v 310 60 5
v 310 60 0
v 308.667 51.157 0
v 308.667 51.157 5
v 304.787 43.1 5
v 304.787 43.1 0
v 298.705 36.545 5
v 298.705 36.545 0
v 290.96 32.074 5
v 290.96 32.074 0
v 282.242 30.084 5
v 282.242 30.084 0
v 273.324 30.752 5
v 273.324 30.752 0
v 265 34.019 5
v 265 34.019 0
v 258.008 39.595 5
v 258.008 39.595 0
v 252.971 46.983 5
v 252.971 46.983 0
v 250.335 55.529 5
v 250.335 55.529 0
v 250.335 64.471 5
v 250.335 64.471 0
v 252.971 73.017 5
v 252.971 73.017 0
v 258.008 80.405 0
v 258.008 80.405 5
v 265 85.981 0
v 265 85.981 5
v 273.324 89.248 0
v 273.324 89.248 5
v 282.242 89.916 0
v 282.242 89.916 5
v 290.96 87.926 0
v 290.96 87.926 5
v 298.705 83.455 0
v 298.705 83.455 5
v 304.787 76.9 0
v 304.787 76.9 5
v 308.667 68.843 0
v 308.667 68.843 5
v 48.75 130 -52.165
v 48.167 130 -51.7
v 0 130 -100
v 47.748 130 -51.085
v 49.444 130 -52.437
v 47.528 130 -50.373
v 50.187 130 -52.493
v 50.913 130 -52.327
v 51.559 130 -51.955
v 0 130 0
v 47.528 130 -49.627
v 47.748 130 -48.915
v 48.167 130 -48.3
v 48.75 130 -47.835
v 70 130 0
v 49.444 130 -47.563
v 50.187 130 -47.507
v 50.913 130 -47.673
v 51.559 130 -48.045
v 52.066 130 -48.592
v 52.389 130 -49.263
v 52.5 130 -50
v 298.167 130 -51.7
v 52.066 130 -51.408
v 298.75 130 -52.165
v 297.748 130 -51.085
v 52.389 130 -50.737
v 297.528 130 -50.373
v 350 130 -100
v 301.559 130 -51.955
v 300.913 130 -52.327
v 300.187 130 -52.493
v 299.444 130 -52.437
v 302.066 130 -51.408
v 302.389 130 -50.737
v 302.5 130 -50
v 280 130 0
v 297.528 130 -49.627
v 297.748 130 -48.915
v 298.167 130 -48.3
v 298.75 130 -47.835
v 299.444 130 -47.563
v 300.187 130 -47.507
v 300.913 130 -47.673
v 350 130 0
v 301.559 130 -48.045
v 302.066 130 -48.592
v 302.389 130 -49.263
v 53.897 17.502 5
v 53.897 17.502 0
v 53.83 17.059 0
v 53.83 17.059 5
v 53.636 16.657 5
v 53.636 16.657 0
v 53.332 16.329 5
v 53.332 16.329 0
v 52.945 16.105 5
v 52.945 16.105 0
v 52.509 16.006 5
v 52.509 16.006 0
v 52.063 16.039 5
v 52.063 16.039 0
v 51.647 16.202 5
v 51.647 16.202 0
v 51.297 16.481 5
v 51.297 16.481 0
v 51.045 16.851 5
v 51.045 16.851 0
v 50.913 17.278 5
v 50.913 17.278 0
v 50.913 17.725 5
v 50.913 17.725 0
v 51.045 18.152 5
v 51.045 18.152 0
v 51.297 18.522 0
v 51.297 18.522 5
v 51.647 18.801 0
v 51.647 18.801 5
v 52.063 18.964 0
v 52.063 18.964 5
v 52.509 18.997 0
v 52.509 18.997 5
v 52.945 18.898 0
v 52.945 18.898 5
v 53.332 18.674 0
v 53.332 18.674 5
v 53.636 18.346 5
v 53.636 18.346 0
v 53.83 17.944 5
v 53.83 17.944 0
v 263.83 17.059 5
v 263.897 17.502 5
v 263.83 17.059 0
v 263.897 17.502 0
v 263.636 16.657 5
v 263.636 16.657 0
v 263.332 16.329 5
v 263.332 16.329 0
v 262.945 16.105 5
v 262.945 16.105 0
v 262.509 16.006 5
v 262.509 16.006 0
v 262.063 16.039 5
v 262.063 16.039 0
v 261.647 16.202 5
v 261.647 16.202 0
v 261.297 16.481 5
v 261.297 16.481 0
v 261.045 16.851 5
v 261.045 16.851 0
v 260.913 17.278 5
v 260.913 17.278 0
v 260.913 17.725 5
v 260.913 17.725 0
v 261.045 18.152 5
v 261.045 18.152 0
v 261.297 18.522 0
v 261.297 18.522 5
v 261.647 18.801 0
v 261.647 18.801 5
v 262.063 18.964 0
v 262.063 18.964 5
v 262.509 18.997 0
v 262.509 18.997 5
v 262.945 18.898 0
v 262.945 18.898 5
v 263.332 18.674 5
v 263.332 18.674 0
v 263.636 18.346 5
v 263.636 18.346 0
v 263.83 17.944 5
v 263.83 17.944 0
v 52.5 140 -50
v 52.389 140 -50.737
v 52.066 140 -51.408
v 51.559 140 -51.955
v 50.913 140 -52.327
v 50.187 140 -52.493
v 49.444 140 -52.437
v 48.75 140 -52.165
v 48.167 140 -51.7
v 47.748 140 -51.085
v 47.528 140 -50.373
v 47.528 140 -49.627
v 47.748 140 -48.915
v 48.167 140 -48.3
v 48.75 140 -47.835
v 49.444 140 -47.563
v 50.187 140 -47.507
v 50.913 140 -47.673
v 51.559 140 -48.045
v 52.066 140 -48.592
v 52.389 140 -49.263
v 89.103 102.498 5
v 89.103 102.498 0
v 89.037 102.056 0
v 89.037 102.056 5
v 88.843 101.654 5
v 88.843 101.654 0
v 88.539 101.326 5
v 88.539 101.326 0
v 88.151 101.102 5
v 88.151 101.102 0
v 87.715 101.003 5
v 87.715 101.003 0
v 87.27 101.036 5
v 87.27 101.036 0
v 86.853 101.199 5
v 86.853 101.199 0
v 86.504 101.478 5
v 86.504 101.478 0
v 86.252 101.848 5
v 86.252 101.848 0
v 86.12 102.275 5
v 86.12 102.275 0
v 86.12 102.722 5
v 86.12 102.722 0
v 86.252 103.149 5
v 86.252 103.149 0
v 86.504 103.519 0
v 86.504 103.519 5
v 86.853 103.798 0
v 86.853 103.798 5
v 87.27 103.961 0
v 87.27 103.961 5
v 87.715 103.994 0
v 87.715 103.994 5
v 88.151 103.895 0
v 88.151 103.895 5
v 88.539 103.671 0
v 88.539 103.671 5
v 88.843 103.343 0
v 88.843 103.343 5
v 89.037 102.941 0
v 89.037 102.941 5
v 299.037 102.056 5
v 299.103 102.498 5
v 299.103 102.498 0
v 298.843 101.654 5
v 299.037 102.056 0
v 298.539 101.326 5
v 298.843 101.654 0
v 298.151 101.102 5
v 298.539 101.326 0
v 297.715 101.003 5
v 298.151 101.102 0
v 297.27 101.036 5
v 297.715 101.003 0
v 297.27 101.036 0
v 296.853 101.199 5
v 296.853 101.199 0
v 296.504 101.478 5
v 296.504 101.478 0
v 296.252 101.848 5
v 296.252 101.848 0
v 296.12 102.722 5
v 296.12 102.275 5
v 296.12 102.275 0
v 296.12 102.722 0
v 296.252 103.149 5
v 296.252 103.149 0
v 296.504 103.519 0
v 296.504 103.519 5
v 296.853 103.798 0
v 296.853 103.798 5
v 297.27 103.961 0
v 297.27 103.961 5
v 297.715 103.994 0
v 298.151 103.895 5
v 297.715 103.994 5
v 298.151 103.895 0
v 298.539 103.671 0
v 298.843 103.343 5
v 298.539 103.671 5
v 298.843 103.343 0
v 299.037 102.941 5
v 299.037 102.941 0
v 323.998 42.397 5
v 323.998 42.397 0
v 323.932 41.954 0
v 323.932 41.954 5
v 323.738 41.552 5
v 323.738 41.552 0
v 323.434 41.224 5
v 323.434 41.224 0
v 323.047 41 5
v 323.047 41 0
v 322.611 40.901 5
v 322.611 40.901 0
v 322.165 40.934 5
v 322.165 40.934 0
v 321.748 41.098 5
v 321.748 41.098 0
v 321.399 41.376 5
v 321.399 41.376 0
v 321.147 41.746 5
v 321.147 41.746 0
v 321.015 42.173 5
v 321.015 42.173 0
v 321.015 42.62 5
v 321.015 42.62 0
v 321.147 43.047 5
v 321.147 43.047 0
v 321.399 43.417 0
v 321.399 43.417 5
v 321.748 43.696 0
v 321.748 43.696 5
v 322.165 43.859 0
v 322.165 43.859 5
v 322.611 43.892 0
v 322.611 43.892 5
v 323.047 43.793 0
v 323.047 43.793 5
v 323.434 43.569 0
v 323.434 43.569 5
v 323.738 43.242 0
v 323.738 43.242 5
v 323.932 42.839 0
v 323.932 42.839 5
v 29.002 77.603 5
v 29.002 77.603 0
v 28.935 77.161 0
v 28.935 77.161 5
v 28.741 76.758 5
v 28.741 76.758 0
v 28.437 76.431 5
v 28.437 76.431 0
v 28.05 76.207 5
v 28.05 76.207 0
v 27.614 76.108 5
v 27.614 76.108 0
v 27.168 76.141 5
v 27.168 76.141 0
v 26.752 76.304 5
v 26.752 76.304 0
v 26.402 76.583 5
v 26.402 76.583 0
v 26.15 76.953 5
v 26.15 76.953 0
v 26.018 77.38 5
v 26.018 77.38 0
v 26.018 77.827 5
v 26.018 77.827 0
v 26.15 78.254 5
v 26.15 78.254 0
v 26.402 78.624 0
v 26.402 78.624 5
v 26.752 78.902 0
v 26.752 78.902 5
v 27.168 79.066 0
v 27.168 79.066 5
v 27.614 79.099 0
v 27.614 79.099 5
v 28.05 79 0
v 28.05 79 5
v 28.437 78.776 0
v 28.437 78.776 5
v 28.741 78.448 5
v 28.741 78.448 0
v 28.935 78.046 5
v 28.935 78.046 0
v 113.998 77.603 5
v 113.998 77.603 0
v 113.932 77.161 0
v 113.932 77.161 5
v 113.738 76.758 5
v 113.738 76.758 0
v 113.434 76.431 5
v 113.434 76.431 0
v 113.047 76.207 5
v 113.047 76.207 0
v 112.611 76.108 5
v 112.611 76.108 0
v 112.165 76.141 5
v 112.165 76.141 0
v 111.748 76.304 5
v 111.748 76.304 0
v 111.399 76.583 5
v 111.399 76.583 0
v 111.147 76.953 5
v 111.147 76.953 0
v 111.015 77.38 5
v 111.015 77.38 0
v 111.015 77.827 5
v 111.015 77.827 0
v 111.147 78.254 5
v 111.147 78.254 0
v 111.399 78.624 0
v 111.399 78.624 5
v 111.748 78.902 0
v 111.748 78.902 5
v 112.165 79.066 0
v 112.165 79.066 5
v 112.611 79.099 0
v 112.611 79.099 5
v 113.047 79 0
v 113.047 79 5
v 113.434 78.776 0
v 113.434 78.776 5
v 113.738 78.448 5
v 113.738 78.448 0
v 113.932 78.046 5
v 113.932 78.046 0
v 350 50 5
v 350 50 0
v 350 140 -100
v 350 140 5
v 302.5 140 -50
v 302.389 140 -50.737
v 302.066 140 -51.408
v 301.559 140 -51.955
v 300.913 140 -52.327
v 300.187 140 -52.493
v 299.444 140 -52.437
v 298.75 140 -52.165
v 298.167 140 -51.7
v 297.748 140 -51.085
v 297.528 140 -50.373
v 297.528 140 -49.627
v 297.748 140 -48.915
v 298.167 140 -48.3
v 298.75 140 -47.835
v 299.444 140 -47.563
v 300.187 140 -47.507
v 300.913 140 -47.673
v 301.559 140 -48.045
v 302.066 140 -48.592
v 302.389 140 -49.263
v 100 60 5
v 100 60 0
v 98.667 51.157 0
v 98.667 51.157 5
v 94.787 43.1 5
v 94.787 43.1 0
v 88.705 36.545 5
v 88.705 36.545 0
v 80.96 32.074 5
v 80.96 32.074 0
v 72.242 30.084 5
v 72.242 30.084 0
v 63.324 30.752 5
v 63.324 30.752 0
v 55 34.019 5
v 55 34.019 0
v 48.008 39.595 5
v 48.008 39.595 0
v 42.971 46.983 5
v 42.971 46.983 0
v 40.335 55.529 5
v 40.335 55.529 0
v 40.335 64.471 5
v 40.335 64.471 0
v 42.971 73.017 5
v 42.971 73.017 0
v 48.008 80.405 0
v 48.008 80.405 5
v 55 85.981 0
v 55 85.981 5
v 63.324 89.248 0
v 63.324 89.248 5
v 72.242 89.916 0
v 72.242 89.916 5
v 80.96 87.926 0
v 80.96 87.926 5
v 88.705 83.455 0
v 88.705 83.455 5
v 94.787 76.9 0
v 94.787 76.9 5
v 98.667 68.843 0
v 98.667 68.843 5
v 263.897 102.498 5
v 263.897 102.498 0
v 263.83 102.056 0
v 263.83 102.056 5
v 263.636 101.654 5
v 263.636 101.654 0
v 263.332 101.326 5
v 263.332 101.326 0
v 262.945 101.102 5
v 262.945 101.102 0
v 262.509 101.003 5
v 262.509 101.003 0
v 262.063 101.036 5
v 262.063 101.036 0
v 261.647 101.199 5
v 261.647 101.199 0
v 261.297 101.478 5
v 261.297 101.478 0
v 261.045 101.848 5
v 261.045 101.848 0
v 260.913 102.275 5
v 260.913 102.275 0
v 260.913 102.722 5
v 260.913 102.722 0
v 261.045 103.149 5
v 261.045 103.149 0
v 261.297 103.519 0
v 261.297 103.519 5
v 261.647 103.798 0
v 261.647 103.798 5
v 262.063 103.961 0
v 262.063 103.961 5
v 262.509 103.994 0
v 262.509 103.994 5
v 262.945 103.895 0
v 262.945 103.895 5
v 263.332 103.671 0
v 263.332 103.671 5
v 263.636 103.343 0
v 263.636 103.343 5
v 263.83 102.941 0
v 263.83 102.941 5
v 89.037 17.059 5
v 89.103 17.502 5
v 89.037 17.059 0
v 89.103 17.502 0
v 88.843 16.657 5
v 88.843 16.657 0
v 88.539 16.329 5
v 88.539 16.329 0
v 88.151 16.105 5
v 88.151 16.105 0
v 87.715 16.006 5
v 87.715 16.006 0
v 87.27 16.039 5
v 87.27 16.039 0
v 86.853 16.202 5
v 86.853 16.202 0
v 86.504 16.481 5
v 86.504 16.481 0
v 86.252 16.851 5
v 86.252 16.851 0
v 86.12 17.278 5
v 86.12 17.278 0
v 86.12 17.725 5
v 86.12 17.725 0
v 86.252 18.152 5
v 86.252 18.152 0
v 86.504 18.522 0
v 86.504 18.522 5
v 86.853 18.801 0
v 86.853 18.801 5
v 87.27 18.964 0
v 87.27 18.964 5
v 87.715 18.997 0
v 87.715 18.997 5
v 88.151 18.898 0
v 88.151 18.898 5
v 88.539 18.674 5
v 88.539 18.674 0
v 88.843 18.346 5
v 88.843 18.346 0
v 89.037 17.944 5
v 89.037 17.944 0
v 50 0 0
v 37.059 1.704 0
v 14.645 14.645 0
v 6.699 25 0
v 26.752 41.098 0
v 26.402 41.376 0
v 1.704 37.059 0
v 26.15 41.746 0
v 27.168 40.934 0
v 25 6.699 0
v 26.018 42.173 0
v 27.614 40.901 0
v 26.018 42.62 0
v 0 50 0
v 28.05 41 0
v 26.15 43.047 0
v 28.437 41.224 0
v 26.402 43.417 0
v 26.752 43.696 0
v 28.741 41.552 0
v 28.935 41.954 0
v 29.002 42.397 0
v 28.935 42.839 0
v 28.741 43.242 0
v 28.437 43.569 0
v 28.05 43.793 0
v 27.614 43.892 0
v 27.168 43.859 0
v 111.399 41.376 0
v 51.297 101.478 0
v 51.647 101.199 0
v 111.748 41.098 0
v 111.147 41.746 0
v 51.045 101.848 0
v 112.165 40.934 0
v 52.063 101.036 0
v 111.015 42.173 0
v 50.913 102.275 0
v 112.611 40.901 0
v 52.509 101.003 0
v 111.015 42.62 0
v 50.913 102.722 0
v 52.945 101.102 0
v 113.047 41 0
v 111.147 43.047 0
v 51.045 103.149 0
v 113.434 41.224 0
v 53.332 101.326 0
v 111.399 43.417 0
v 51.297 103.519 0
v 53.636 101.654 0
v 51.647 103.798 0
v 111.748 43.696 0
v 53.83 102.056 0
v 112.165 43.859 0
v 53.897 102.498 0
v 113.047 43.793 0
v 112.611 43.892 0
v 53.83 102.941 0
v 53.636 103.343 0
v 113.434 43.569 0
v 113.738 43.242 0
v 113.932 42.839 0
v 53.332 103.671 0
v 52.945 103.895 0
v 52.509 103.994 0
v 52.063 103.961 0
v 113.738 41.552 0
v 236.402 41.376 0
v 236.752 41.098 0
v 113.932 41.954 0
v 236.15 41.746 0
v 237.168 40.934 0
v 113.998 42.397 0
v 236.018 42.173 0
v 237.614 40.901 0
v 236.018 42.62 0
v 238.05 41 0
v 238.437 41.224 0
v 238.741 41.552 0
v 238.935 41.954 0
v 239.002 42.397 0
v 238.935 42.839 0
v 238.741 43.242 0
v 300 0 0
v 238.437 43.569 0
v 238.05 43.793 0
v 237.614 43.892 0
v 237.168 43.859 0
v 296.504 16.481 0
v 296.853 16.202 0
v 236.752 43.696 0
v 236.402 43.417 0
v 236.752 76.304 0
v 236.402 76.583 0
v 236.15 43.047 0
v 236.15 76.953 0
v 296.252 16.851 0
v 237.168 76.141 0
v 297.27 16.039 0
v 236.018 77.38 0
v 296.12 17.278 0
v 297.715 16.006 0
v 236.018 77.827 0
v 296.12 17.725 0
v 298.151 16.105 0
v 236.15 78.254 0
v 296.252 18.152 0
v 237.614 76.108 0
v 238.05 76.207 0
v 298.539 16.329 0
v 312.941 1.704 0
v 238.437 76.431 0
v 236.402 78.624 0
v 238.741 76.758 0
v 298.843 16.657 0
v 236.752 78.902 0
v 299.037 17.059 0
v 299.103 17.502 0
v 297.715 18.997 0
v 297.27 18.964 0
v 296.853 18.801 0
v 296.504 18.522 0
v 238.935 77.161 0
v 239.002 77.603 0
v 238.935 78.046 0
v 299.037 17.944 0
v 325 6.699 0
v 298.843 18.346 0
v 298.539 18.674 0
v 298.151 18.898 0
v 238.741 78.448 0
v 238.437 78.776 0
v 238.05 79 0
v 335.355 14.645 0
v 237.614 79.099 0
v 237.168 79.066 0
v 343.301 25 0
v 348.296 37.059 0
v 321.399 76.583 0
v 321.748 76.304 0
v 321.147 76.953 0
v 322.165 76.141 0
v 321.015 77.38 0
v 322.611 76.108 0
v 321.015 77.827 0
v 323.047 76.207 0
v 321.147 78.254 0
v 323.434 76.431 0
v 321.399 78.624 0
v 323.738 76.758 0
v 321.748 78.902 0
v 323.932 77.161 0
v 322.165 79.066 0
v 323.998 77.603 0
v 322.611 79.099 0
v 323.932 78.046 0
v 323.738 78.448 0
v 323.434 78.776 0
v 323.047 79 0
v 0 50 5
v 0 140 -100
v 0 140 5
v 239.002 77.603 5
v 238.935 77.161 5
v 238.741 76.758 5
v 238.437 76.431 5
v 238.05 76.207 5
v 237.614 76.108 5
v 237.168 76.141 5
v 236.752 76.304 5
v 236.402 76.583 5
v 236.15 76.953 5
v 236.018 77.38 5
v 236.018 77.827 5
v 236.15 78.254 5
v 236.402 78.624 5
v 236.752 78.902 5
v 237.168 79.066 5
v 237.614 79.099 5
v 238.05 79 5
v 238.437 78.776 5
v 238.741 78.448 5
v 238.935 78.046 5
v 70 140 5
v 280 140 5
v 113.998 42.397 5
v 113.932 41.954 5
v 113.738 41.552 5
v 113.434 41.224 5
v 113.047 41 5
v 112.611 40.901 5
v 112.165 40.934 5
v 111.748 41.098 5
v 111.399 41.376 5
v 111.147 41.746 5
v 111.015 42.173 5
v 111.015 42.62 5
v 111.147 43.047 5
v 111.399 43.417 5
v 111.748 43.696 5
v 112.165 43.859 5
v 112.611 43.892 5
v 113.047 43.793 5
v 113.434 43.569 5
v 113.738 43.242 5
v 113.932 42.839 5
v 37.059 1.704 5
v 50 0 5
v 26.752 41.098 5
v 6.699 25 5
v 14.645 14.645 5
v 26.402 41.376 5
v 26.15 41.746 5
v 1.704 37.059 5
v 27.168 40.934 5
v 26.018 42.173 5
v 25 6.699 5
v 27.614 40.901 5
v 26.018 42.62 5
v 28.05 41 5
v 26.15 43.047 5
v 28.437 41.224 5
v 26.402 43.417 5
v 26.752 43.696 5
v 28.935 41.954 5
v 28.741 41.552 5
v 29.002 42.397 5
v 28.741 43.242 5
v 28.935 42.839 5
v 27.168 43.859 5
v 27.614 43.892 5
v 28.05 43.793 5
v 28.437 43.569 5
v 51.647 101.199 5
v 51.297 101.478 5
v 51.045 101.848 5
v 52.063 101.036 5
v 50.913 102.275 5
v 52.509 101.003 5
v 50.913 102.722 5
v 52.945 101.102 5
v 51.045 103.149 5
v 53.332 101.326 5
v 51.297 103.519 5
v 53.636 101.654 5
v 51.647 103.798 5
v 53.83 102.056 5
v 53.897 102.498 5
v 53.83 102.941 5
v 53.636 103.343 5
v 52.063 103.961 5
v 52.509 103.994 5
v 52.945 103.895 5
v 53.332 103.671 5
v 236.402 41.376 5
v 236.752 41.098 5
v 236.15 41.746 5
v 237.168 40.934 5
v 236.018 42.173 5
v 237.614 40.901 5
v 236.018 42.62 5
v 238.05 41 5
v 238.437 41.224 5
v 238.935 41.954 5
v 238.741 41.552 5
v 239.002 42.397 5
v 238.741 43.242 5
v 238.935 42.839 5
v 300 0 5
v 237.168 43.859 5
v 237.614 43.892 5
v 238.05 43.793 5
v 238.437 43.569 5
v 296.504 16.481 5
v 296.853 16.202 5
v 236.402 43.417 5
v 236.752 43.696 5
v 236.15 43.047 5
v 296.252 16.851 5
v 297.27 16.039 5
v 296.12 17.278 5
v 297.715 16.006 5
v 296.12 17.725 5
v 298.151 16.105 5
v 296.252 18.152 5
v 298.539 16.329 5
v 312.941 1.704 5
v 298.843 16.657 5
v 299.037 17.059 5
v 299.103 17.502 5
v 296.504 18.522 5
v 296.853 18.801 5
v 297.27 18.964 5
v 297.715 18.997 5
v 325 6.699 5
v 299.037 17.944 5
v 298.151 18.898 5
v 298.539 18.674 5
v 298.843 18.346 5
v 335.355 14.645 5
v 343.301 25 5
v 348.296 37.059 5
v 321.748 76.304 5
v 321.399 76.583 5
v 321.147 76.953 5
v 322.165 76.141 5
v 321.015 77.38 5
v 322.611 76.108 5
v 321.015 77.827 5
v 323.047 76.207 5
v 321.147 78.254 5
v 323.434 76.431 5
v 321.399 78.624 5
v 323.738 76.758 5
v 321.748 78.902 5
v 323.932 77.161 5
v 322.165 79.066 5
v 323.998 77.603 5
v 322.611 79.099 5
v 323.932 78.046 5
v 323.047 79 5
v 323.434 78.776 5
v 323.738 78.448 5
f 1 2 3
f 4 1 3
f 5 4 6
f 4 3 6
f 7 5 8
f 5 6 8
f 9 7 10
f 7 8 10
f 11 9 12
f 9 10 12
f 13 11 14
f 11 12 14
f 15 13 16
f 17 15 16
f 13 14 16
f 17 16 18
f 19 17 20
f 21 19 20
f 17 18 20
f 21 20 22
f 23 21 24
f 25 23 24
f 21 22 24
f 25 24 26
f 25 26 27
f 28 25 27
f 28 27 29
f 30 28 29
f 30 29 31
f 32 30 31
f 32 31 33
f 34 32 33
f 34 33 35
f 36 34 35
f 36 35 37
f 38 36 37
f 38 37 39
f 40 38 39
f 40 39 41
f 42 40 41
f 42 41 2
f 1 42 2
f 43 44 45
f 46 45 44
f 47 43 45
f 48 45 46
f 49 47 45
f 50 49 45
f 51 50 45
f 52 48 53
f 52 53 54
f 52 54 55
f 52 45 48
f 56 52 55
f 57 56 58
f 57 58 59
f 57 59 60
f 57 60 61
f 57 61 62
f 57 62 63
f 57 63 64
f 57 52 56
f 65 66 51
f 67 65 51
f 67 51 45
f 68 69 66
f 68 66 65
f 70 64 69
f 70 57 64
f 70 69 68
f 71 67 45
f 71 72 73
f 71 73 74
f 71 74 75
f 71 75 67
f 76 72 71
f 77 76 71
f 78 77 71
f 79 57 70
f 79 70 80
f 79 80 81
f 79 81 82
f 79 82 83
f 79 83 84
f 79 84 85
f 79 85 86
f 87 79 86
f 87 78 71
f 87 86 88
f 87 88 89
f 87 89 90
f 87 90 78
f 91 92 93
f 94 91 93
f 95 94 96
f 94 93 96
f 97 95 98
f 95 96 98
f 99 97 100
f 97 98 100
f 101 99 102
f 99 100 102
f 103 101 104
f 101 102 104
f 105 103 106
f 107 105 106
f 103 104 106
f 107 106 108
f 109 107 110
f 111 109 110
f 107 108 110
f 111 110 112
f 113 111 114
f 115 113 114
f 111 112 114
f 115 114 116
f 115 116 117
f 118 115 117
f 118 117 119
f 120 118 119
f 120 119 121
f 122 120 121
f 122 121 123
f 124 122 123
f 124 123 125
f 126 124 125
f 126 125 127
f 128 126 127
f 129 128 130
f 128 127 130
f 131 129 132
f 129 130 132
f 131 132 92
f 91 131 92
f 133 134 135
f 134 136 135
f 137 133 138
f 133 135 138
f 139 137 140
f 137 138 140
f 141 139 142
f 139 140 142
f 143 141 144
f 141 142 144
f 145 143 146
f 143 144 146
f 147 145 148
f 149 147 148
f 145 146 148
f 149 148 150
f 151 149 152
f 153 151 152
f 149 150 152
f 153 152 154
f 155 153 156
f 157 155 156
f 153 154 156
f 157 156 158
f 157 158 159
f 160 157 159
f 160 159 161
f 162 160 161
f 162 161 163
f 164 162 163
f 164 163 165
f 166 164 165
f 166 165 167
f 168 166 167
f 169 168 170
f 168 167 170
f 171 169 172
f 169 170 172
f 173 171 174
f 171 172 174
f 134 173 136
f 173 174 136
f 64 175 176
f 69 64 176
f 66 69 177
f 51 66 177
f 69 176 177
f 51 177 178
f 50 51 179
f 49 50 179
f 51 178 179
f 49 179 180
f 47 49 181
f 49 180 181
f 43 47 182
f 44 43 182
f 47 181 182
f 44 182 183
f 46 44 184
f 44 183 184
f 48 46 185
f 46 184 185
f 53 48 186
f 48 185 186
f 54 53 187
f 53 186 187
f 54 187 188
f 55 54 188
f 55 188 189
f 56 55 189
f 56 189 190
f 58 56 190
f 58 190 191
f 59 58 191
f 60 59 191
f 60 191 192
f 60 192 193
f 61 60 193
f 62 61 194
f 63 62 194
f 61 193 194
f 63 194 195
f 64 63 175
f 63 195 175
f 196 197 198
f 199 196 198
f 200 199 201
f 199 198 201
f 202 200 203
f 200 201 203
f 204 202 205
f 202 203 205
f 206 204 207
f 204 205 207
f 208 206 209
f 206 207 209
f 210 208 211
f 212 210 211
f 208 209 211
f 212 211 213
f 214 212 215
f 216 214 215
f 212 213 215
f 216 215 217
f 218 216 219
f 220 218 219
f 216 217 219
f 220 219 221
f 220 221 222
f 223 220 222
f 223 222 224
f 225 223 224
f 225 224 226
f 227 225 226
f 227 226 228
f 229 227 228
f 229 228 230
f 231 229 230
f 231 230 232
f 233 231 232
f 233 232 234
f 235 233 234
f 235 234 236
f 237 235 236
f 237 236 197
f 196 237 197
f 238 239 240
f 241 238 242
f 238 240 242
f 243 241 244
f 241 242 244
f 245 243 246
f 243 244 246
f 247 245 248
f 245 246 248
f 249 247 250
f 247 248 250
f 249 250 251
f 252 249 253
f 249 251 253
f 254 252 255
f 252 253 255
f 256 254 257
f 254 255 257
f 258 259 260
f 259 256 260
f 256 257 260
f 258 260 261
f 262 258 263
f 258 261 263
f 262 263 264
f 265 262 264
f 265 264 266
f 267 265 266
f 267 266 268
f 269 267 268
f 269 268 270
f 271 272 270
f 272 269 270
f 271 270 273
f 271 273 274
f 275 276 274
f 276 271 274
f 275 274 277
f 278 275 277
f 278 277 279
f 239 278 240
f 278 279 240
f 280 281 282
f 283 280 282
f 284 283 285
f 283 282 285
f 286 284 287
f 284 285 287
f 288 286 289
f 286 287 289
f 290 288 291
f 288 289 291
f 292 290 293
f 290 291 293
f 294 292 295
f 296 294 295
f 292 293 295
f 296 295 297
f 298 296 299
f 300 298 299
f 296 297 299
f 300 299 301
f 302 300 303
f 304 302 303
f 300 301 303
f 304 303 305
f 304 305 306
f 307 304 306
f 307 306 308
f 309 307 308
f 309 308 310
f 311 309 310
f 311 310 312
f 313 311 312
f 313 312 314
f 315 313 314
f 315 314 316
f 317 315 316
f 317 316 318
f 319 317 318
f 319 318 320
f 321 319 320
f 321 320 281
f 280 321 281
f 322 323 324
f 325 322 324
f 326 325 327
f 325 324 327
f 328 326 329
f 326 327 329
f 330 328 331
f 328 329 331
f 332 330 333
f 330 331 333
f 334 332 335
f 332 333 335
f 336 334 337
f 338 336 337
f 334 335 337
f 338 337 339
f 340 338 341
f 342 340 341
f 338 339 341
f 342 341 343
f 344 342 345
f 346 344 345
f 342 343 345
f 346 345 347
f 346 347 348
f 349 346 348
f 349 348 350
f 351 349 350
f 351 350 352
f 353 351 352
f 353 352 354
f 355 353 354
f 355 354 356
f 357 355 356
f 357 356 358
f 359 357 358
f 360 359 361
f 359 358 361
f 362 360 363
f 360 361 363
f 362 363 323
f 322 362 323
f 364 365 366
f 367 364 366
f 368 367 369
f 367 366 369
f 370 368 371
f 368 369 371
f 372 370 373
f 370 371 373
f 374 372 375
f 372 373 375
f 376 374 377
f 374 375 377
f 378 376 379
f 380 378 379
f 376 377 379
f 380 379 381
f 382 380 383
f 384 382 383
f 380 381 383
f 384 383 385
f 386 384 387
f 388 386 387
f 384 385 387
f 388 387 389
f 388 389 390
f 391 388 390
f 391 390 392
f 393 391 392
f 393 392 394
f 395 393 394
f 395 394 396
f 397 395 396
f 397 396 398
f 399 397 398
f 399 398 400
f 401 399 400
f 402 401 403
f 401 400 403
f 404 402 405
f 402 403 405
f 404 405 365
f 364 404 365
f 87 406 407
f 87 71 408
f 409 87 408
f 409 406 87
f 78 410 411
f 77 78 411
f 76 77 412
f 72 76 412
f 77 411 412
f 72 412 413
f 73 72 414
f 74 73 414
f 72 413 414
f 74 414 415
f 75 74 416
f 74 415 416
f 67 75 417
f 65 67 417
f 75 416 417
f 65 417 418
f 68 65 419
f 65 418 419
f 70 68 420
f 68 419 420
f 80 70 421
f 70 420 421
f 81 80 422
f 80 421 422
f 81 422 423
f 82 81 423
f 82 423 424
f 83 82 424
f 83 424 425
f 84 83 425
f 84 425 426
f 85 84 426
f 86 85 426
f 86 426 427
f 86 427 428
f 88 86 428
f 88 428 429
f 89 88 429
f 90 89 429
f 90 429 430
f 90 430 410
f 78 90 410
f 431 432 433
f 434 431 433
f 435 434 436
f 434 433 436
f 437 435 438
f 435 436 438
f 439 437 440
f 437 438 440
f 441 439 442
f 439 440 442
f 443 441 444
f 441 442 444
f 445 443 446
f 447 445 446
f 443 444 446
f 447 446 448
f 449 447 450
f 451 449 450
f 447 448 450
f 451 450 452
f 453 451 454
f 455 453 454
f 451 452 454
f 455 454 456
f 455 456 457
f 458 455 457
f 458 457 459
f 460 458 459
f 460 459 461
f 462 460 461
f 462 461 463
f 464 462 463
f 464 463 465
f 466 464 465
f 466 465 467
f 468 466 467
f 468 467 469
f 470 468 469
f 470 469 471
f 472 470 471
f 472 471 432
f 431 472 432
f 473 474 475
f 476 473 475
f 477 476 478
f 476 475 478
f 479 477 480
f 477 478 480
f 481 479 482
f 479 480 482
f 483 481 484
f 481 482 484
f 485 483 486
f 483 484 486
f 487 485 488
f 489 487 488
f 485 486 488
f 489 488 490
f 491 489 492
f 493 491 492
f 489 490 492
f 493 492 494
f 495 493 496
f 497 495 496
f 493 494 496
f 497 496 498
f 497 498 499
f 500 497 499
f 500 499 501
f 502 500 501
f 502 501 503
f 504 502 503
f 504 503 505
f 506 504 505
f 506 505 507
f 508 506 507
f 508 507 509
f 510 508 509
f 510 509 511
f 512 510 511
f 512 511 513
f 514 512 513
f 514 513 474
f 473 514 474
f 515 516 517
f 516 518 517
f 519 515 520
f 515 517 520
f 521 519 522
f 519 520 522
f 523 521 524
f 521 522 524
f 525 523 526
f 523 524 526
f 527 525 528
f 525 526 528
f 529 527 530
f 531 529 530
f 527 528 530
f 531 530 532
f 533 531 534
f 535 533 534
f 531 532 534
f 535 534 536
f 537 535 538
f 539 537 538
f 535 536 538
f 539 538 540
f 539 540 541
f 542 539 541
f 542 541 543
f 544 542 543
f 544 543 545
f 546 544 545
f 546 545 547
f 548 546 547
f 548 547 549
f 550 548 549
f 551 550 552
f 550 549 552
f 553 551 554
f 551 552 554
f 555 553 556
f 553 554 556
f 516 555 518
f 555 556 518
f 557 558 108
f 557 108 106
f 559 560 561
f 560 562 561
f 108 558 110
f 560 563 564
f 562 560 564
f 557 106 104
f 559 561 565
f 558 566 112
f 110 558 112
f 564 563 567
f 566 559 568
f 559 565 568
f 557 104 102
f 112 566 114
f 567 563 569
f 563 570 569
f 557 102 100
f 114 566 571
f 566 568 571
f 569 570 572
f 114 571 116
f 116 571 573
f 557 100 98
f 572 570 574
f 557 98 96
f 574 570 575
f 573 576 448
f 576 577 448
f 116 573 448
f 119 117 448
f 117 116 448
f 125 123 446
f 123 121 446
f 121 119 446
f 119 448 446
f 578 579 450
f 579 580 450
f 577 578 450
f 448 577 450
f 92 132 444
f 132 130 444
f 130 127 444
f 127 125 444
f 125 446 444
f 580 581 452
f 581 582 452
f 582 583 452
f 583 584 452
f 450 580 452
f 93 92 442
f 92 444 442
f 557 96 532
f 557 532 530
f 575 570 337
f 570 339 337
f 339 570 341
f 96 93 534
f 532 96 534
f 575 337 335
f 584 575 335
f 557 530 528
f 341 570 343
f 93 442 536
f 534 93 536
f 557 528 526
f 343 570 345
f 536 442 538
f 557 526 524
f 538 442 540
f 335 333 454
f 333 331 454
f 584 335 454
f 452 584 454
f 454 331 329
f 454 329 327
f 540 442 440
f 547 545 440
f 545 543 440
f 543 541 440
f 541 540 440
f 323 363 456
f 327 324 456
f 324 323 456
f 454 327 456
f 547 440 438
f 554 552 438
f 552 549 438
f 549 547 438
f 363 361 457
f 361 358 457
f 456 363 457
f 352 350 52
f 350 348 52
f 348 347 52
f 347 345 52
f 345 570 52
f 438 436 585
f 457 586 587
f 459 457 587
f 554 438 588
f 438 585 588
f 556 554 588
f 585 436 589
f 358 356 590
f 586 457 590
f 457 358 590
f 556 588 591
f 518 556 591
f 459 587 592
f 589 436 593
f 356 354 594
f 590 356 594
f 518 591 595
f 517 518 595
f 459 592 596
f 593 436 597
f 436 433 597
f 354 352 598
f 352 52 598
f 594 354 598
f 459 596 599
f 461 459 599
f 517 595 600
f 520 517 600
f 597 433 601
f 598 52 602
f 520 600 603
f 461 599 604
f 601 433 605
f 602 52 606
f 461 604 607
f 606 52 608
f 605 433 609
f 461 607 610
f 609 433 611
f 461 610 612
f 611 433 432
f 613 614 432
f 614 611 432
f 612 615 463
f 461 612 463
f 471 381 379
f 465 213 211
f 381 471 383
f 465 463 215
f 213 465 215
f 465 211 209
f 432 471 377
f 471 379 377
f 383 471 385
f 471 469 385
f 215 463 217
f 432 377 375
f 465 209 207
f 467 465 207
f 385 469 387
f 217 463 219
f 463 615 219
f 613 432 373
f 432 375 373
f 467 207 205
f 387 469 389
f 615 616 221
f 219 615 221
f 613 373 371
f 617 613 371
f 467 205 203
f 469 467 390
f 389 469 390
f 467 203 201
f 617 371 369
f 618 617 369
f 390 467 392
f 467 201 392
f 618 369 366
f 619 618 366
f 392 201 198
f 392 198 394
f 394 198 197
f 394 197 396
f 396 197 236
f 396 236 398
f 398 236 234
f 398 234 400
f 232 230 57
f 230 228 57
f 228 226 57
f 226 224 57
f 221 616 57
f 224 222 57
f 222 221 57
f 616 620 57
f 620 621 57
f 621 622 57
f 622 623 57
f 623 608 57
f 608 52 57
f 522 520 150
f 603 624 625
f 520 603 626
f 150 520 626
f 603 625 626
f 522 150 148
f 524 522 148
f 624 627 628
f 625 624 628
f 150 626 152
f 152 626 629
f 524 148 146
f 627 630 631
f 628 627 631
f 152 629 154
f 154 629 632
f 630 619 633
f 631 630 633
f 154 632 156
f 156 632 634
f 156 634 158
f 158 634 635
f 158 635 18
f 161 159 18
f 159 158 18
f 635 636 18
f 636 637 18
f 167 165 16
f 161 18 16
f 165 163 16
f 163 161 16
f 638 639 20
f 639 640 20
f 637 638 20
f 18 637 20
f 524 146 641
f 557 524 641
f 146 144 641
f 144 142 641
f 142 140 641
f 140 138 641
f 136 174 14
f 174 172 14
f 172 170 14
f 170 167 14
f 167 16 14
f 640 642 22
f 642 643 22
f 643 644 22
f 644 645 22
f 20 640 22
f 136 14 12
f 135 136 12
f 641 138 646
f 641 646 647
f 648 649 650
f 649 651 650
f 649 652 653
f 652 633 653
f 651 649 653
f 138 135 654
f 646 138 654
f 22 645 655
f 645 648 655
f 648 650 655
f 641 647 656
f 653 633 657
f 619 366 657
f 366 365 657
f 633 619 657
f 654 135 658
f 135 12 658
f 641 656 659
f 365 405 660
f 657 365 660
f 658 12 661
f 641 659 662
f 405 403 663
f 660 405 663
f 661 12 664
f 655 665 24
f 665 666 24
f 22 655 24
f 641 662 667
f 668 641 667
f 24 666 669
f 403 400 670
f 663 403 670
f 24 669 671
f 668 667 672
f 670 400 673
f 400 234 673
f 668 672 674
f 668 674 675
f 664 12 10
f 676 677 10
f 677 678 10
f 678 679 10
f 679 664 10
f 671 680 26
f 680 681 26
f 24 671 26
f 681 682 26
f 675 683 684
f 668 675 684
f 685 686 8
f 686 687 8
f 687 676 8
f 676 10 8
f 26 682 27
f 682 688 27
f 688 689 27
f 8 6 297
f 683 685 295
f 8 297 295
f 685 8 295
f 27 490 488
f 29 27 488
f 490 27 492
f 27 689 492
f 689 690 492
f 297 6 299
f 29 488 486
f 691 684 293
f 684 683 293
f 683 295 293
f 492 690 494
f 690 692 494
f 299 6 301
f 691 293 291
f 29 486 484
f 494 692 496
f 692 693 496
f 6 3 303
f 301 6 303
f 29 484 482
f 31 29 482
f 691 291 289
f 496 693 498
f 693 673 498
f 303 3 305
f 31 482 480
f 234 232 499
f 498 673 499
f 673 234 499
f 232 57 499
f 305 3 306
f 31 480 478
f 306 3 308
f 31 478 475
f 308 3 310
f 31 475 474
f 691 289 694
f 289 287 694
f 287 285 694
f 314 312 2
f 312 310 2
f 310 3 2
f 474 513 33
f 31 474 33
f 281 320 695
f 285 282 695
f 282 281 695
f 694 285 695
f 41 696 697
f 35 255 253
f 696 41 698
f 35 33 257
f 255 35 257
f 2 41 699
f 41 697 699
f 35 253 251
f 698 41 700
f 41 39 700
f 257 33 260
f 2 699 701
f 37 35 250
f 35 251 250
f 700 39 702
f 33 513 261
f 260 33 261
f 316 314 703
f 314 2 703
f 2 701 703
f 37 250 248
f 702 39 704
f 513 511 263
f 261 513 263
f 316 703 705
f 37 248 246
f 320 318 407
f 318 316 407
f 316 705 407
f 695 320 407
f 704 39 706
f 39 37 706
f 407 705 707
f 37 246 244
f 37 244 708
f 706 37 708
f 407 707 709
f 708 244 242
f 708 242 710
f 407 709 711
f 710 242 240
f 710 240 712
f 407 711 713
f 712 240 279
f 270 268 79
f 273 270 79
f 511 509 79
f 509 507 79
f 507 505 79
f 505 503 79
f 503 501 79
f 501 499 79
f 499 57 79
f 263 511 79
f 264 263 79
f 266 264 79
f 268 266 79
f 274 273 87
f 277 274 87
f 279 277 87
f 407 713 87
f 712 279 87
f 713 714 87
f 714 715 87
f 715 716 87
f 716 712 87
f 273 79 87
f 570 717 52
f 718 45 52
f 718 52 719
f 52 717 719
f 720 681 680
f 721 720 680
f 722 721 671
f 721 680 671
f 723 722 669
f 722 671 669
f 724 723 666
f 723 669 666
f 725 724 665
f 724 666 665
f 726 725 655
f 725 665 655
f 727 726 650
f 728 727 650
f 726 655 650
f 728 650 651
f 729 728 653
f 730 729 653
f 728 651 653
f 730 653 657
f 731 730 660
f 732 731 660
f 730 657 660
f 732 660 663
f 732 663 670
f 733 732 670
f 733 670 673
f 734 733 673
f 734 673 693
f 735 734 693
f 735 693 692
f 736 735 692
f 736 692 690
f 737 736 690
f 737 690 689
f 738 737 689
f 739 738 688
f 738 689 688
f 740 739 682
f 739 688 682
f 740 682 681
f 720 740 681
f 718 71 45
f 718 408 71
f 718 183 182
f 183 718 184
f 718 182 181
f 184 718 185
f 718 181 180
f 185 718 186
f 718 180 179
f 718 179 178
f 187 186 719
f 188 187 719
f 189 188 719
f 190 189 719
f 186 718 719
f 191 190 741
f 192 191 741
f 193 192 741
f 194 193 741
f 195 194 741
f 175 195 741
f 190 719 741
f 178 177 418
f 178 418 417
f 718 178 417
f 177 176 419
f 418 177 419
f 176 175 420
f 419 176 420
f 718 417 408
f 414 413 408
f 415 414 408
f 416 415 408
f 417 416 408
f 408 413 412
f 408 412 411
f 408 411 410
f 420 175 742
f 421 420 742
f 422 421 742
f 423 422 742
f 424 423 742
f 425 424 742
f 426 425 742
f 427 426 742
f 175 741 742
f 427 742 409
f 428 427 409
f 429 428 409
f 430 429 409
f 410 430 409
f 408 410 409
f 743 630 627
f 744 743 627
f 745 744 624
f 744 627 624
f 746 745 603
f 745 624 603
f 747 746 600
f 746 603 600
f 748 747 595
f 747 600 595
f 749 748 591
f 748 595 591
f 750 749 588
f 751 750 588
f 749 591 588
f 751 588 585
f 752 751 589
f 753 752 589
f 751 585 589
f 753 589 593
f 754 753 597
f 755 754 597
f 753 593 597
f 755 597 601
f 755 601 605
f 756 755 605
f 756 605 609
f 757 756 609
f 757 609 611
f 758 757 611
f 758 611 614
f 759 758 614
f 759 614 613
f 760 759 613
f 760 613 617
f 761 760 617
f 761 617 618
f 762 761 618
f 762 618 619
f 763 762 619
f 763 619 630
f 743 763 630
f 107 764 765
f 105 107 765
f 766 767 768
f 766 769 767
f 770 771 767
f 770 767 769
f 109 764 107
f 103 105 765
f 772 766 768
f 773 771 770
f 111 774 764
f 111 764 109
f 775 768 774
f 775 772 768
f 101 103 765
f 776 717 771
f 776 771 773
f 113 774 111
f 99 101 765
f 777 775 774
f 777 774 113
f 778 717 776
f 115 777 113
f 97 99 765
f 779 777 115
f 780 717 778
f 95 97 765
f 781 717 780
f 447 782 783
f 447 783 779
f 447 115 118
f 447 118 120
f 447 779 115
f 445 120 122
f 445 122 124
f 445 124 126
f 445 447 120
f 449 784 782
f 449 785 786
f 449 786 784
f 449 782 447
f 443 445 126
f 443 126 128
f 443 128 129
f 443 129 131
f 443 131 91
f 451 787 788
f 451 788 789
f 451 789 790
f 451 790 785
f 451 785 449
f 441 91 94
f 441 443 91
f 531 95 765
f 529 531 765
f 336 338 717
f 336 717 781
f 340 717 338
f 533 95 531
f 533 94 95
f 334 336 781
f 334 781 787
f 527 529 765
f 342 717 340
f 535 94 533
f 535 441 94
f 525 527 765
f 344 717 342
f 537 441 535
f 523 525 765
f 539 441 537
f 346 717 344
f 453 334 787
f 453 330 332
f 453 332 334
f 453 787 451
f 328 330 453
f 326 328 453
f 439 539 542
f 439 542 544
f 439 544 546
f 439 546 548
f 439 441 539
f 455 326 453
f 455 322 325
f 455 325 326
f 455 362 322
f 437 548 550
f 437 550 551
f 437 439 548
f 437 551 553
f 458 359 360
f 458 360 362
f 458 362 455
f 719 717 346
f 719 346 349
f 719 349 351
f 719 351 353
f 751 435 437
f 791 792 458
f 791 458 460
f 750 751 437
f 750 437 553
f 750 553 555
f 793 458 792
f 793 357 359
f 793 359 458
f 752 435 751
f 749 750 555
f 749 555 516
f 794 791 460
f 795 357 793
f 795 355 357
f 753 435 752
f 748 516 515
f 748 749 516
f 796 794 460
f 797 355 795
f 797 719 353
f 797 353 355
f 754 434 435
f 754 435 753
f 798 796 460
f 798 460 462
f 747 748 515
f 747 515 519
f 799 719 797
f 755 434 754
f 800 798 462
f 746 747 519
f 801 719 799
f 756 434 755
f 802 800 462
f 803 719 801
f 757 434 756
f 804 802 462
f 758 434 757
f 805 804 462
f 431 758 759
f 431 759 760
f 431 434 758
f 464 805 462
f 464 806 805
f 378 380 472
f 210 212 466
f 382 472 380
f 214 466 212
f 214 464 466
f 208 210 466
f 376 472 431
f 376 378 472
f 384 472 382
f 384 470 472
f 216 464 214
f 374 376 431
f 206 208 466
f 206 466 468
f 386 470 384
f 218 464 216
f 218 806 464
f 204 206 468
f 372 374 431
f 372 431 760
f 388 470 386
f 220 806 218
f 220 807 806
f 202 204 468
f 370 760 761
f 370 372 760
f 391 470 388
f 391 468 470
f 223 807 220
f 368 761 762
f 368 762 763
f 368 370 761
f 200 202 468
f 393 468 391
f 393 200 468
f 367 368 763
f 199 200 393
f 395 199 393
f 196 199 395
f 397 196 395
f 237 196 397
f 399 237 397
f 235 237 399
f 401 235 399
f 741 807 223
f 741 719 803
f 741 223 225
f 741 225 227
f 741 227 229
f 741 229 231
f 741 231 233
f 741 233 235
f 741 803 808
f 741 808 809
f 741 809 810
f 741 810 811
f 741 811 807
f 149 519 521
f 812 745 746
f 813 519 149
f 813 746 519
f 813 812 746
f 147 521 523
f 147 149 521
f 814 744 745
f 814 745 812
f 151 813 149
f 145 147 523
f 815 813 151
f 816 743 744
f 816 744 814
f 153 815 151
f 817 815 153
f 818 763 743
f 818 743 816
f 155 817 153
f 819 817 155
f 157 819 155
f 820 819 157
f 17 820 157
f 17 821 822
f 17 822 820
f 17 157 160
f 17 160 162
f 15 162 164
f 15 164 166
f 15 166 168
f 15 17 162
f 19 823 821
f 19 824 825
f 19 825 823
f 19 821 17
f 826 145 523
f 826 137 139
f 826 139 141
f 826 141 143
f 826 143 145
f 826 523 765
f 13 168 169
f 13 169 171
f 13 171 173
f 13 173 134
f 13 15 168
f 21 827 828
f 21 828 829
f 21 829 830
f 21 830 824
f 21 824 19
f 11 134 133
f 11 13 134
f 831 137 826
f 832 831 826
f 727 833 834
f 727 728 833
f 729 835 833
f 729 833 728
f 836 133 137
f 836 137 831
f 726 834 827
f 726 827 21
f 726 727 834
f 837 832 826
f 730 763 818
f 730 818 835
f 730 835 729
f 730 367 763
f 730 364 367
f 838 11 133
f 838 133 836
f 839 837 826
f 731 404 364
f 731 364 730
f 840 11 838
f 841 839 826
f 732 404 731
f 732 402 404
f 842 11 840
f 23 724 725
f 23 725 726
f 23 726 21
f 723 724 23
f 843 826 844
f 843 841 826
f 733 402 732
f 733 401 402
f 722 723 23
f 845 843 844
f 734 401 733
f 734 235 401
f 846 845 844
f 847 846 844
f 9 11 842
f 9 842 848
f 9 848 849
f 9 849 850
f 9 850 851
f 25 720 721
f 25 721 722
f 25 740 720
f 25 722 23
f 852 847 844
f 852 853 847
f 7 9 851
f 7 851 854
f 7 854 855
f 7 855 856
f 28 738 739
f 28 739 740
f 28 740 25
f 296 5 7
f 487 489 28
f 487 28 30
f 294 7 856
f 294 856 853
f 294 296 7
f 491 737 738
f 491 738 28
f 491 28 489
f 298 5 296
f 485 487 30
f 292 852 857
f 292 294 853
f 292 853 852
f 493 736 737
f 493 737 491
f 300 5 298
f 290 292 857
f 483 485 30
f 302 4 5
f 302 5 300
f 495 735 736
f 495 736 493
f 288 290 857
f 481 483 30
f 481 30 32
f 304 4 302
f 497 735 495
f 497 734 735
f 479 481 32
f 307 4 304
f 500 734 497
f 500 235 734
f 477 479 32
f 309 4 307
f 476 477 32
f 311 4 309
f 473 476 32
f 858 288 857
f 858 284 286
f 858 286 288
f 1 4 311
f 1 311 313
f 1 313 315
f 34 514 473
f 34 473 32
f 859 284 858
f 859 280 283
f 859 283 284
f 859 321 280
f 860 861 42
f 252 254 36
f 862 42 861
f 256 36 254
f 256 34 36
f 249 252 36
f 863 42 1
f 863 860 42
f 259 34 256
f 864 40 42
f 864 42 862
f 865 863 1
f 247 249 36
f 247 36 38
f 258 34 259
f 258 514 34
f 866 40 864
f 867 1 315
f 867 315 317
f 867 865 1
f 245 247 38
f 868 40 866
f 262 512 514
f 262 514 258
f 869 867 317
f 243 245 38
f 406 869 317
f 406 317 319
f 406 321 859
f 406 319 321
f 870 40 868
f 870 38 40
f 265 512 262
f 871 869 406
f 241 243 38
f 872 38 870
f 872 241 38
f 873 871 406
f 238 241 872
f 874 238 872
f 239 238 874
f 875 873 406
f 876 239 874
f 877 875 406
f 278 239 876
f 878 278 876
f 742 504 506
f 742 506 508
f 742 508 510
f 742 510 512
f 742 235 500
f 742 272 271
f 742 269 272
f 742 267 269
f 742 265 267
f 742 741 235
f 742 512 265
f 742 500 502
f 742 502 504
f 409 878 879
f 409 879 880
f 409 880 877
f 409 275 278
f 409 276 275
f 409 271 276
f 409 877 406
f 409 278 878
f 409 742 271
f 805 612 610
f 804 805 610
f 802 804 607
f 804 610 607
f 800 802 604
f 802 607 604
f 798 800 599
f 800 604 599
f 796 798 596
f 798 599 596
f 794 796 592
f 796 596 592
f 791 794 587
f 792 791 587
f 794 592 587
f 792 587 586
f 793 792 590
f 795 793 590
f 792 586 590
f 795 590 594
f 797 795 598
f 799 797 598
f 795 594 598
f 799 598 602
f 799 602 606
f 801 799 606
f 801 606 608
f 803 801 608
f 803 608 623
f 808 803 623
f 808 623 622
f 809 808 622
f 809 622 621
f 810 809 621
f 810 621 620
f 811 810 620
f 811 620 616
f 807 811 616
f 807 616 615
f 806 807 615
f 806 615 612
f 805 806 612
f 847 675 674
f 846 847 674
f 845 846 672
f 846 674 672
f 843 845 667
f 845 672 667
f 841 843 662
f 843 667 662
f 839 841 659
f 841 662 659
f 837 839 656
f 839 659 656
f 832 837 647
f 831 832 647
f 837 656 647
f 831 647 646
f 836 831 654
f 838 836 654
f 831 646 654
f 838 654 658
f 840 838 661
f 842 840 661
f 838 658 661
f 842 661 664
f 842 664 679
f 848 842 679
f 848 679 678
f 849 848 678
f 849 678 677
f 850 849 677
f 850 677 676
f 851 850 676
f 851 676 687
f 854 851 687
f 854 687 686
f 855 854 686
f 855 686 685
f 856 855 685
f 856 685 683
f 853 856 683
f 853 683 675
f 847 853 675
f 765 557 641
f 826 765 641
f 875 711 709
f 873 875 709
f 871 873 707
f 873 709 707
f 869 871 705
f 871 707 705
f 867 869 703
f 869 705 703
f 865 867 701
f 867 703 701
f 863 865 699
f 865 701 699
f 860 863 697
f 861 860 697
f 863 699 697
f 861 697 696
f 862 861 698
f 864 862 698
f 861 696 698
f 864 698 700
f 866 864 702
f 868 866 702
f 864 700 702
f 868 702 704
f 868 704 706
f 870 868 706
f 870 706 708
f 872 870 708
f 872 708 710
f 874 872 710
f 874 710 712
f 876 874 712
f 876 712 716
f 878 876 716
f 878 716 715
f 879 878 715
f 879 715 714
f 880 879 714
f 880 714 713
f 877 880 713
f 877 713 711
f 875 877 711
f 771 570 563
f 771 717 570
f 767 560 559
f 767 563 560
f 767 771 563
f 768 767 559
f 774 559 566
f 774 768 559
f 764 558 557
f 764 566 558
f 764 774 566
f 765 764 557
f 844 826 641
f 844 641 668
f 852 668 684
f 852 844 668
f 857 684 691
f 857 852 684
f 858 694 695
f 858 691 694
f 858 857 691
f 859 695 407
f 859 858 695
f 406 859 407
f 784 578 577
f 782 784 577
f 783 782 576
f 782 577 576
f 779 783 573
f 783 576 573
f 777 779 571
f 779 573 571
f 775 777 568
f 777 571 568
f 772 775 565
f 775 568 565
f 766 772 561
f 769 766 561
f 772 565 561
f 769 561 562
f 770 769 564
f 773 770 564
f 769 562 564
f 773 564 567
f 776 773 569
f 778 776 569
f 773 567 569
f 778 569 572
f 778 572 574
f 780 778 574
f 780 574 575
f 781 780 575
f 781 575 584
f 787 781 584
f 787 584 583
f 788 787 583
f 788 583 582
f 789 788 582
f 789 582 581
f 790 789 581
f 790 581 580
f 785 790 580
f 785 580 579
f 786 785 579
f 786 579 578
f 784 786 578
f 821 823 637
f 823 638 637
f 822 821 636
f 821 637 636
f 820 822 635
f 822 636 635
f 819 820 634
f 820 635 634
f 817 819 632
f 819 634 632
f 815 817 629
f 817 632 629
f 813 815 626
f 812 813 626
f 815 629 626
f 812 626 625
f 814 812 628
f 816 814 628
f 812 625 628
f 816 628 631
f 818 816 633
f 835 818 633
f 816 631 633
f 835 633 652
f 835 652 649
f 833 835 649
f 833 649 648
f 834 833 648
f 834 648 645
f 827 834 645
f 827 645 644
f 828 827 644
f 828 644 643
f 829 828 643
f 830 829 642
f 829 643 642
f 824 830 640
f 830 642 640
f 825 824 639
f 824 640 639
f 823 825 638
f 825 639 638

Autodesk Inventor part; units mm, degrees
ref_plane "YZ Plane" through (0, 0, 0) normal (1, 0, 0) x (0, 1, 0)
ref_plane "XZ Plane" through (0, 0, 0) normal (0, 1, 0) x (-1, 0, 0)
ref_plane "XY Plane" through (0, 0, 0) normal (0, 0, 1) x (1, 0, 0)
sketch "スケッチ1" plane through (0, 0, 0) normal (0, 0, 1) x (1, 0, 0)
  line L0 (0, 0) -> (350, 0)
  line L1 (350, 0) -> (350, 140)
  line L2 (350, 140) -> (0, 140)
  circle A0 centre (70, 60) radius 46
  circle A1 centre (280, 60) radius 46
  line L3 (0, 140) -> (0, 0)
  line L4 (70, 60) -> (70, 156.3161)
  line L5 (280, 60) -> (280, 147.5689)
  line L6 (70, 60) -> (45.2011, 119.8698)
  line L7 (280, 60) -> (258.2896, 112.4136)
  circle A2 centre (52.3966, 102.4985) radius 1.5
  circle A3 centre (262.3966, 102.4985) radius 1.5
  circle A4 centre (27.5015, 77.6034) radius 1.5
  circle A5 centre (27.5015, 42.3966) radius 1.5
  circle A6 centre (52.3966, 17.5015) radius 1.5
  circle A7 centre (87.6034, 17.5015) radius 1.5
  circle A8 centre (112.4985, 42.3966) radius 1.5
  circle A9 centre (112.4985, 77.6034) radius 1.5
  circle A10 centre (87.6034, 102.4985) radius 1.5
  circle A11 centre (237.5015, 77.6034) radius 1.5
  circle A12 centre (237.5015, 42.3966) radius 1.5
  circle A13 centre (262.3966, 17.5015) radius 1.5
  circle A14 centre (297.6034, 17.5015) radius 1.5
  circle A15 centre (322.4985, 42.3966) radius 1.5
  circle A16 centre (322.4985, 77.6034) radius 1.5
  circle A17 centre (297.6034, 102.4985) radius 1.5
  circle A18 centre (70, 60) radius 30
  circle A19 centre (280, 60) radius 30
  dimension "d5" = 92
  dimension "d6" = 92
  dimension "d0" = 350
  dimension "d1" = 140
  dimension "d2" = 60
  dimension "d3" = 60
  dimension "d9" = 70
  dimension "d10" = 70
  dimension "d11" = 22.5
  dimension "d12" = 22.5
  dimension "d13" = 3
  dimension "d14" = 3
  dimension "d17" = 360
  dimension "d21" = 360
  dimension "d23" = 60
  dimension "d24" = 60
extrude "押し出し1" add sketch "スケッチ1" along normal blind 5 contours A1 A17 A16 A15 A14 A13 A12 A11 A3 L7 A19 L5 | L5 A19 L7 A3 A1 | A0 A10 A9 A8 A7 A6 A5 A4 A2 L6 A18 L4 | L4 A18 L6 A2 A0 | L3 L2 L1 L0
sketch "スケッチ2" plane through (0, 0, 0) normal (0, 0, -1) x (-1, 0, 0)
  line L0 (-350, 0) -> (-350, 140) projected
  line L1 (0, 140) -> (-350, 140)
  line L2 (-350, 140) -> (-350, 120)
  line L3 (0, 120) -> (0, 140)
  line L4 (-350, 140) -> (0, 140)
  line L5 (0, 140) -> (0, 130)
  line L6 (0, 130) -> (-350, 130)
  line L7 (-350, 130) -> (-350, 140)
  point P0 (0, 0)
  point P1 (-175, 130)
  dimension "d30" = 10
extrude "押し出し2" add sketch "スケッチ2" along normal blind 100
sketch "スケッチ3" plane through (0, 140, 5) normal (0, 1, 0) x (1, 0, 0)
  circle A0 centre (50, 55) radius 2.5
  circle A1 centre (300, 55) radius 2.5
  line L0 (0, 105) -> (350, 105) projected
  line L1 (0, 0) -> (0, 105) projected
  point P0 (0, 5)
  dimension "d31" = 50
  dimension "d32" = 50
  dimension "d33" = 250
  dimension "d34" = 50
  dimension "d35" = 5
  dimension "d36" = 5
extrude "押し出し3" cut sketch "スケッチ3" against normal blind 100
fillet "フィレット2" radius 50 2 edges at (350, 0, 2.5) (0, 0, 2.5)
equation "\"d6\" = d5"
equation "\"d2\" = d3"
equation "\"d10\" = d9"
properties part number "legparts_09"
